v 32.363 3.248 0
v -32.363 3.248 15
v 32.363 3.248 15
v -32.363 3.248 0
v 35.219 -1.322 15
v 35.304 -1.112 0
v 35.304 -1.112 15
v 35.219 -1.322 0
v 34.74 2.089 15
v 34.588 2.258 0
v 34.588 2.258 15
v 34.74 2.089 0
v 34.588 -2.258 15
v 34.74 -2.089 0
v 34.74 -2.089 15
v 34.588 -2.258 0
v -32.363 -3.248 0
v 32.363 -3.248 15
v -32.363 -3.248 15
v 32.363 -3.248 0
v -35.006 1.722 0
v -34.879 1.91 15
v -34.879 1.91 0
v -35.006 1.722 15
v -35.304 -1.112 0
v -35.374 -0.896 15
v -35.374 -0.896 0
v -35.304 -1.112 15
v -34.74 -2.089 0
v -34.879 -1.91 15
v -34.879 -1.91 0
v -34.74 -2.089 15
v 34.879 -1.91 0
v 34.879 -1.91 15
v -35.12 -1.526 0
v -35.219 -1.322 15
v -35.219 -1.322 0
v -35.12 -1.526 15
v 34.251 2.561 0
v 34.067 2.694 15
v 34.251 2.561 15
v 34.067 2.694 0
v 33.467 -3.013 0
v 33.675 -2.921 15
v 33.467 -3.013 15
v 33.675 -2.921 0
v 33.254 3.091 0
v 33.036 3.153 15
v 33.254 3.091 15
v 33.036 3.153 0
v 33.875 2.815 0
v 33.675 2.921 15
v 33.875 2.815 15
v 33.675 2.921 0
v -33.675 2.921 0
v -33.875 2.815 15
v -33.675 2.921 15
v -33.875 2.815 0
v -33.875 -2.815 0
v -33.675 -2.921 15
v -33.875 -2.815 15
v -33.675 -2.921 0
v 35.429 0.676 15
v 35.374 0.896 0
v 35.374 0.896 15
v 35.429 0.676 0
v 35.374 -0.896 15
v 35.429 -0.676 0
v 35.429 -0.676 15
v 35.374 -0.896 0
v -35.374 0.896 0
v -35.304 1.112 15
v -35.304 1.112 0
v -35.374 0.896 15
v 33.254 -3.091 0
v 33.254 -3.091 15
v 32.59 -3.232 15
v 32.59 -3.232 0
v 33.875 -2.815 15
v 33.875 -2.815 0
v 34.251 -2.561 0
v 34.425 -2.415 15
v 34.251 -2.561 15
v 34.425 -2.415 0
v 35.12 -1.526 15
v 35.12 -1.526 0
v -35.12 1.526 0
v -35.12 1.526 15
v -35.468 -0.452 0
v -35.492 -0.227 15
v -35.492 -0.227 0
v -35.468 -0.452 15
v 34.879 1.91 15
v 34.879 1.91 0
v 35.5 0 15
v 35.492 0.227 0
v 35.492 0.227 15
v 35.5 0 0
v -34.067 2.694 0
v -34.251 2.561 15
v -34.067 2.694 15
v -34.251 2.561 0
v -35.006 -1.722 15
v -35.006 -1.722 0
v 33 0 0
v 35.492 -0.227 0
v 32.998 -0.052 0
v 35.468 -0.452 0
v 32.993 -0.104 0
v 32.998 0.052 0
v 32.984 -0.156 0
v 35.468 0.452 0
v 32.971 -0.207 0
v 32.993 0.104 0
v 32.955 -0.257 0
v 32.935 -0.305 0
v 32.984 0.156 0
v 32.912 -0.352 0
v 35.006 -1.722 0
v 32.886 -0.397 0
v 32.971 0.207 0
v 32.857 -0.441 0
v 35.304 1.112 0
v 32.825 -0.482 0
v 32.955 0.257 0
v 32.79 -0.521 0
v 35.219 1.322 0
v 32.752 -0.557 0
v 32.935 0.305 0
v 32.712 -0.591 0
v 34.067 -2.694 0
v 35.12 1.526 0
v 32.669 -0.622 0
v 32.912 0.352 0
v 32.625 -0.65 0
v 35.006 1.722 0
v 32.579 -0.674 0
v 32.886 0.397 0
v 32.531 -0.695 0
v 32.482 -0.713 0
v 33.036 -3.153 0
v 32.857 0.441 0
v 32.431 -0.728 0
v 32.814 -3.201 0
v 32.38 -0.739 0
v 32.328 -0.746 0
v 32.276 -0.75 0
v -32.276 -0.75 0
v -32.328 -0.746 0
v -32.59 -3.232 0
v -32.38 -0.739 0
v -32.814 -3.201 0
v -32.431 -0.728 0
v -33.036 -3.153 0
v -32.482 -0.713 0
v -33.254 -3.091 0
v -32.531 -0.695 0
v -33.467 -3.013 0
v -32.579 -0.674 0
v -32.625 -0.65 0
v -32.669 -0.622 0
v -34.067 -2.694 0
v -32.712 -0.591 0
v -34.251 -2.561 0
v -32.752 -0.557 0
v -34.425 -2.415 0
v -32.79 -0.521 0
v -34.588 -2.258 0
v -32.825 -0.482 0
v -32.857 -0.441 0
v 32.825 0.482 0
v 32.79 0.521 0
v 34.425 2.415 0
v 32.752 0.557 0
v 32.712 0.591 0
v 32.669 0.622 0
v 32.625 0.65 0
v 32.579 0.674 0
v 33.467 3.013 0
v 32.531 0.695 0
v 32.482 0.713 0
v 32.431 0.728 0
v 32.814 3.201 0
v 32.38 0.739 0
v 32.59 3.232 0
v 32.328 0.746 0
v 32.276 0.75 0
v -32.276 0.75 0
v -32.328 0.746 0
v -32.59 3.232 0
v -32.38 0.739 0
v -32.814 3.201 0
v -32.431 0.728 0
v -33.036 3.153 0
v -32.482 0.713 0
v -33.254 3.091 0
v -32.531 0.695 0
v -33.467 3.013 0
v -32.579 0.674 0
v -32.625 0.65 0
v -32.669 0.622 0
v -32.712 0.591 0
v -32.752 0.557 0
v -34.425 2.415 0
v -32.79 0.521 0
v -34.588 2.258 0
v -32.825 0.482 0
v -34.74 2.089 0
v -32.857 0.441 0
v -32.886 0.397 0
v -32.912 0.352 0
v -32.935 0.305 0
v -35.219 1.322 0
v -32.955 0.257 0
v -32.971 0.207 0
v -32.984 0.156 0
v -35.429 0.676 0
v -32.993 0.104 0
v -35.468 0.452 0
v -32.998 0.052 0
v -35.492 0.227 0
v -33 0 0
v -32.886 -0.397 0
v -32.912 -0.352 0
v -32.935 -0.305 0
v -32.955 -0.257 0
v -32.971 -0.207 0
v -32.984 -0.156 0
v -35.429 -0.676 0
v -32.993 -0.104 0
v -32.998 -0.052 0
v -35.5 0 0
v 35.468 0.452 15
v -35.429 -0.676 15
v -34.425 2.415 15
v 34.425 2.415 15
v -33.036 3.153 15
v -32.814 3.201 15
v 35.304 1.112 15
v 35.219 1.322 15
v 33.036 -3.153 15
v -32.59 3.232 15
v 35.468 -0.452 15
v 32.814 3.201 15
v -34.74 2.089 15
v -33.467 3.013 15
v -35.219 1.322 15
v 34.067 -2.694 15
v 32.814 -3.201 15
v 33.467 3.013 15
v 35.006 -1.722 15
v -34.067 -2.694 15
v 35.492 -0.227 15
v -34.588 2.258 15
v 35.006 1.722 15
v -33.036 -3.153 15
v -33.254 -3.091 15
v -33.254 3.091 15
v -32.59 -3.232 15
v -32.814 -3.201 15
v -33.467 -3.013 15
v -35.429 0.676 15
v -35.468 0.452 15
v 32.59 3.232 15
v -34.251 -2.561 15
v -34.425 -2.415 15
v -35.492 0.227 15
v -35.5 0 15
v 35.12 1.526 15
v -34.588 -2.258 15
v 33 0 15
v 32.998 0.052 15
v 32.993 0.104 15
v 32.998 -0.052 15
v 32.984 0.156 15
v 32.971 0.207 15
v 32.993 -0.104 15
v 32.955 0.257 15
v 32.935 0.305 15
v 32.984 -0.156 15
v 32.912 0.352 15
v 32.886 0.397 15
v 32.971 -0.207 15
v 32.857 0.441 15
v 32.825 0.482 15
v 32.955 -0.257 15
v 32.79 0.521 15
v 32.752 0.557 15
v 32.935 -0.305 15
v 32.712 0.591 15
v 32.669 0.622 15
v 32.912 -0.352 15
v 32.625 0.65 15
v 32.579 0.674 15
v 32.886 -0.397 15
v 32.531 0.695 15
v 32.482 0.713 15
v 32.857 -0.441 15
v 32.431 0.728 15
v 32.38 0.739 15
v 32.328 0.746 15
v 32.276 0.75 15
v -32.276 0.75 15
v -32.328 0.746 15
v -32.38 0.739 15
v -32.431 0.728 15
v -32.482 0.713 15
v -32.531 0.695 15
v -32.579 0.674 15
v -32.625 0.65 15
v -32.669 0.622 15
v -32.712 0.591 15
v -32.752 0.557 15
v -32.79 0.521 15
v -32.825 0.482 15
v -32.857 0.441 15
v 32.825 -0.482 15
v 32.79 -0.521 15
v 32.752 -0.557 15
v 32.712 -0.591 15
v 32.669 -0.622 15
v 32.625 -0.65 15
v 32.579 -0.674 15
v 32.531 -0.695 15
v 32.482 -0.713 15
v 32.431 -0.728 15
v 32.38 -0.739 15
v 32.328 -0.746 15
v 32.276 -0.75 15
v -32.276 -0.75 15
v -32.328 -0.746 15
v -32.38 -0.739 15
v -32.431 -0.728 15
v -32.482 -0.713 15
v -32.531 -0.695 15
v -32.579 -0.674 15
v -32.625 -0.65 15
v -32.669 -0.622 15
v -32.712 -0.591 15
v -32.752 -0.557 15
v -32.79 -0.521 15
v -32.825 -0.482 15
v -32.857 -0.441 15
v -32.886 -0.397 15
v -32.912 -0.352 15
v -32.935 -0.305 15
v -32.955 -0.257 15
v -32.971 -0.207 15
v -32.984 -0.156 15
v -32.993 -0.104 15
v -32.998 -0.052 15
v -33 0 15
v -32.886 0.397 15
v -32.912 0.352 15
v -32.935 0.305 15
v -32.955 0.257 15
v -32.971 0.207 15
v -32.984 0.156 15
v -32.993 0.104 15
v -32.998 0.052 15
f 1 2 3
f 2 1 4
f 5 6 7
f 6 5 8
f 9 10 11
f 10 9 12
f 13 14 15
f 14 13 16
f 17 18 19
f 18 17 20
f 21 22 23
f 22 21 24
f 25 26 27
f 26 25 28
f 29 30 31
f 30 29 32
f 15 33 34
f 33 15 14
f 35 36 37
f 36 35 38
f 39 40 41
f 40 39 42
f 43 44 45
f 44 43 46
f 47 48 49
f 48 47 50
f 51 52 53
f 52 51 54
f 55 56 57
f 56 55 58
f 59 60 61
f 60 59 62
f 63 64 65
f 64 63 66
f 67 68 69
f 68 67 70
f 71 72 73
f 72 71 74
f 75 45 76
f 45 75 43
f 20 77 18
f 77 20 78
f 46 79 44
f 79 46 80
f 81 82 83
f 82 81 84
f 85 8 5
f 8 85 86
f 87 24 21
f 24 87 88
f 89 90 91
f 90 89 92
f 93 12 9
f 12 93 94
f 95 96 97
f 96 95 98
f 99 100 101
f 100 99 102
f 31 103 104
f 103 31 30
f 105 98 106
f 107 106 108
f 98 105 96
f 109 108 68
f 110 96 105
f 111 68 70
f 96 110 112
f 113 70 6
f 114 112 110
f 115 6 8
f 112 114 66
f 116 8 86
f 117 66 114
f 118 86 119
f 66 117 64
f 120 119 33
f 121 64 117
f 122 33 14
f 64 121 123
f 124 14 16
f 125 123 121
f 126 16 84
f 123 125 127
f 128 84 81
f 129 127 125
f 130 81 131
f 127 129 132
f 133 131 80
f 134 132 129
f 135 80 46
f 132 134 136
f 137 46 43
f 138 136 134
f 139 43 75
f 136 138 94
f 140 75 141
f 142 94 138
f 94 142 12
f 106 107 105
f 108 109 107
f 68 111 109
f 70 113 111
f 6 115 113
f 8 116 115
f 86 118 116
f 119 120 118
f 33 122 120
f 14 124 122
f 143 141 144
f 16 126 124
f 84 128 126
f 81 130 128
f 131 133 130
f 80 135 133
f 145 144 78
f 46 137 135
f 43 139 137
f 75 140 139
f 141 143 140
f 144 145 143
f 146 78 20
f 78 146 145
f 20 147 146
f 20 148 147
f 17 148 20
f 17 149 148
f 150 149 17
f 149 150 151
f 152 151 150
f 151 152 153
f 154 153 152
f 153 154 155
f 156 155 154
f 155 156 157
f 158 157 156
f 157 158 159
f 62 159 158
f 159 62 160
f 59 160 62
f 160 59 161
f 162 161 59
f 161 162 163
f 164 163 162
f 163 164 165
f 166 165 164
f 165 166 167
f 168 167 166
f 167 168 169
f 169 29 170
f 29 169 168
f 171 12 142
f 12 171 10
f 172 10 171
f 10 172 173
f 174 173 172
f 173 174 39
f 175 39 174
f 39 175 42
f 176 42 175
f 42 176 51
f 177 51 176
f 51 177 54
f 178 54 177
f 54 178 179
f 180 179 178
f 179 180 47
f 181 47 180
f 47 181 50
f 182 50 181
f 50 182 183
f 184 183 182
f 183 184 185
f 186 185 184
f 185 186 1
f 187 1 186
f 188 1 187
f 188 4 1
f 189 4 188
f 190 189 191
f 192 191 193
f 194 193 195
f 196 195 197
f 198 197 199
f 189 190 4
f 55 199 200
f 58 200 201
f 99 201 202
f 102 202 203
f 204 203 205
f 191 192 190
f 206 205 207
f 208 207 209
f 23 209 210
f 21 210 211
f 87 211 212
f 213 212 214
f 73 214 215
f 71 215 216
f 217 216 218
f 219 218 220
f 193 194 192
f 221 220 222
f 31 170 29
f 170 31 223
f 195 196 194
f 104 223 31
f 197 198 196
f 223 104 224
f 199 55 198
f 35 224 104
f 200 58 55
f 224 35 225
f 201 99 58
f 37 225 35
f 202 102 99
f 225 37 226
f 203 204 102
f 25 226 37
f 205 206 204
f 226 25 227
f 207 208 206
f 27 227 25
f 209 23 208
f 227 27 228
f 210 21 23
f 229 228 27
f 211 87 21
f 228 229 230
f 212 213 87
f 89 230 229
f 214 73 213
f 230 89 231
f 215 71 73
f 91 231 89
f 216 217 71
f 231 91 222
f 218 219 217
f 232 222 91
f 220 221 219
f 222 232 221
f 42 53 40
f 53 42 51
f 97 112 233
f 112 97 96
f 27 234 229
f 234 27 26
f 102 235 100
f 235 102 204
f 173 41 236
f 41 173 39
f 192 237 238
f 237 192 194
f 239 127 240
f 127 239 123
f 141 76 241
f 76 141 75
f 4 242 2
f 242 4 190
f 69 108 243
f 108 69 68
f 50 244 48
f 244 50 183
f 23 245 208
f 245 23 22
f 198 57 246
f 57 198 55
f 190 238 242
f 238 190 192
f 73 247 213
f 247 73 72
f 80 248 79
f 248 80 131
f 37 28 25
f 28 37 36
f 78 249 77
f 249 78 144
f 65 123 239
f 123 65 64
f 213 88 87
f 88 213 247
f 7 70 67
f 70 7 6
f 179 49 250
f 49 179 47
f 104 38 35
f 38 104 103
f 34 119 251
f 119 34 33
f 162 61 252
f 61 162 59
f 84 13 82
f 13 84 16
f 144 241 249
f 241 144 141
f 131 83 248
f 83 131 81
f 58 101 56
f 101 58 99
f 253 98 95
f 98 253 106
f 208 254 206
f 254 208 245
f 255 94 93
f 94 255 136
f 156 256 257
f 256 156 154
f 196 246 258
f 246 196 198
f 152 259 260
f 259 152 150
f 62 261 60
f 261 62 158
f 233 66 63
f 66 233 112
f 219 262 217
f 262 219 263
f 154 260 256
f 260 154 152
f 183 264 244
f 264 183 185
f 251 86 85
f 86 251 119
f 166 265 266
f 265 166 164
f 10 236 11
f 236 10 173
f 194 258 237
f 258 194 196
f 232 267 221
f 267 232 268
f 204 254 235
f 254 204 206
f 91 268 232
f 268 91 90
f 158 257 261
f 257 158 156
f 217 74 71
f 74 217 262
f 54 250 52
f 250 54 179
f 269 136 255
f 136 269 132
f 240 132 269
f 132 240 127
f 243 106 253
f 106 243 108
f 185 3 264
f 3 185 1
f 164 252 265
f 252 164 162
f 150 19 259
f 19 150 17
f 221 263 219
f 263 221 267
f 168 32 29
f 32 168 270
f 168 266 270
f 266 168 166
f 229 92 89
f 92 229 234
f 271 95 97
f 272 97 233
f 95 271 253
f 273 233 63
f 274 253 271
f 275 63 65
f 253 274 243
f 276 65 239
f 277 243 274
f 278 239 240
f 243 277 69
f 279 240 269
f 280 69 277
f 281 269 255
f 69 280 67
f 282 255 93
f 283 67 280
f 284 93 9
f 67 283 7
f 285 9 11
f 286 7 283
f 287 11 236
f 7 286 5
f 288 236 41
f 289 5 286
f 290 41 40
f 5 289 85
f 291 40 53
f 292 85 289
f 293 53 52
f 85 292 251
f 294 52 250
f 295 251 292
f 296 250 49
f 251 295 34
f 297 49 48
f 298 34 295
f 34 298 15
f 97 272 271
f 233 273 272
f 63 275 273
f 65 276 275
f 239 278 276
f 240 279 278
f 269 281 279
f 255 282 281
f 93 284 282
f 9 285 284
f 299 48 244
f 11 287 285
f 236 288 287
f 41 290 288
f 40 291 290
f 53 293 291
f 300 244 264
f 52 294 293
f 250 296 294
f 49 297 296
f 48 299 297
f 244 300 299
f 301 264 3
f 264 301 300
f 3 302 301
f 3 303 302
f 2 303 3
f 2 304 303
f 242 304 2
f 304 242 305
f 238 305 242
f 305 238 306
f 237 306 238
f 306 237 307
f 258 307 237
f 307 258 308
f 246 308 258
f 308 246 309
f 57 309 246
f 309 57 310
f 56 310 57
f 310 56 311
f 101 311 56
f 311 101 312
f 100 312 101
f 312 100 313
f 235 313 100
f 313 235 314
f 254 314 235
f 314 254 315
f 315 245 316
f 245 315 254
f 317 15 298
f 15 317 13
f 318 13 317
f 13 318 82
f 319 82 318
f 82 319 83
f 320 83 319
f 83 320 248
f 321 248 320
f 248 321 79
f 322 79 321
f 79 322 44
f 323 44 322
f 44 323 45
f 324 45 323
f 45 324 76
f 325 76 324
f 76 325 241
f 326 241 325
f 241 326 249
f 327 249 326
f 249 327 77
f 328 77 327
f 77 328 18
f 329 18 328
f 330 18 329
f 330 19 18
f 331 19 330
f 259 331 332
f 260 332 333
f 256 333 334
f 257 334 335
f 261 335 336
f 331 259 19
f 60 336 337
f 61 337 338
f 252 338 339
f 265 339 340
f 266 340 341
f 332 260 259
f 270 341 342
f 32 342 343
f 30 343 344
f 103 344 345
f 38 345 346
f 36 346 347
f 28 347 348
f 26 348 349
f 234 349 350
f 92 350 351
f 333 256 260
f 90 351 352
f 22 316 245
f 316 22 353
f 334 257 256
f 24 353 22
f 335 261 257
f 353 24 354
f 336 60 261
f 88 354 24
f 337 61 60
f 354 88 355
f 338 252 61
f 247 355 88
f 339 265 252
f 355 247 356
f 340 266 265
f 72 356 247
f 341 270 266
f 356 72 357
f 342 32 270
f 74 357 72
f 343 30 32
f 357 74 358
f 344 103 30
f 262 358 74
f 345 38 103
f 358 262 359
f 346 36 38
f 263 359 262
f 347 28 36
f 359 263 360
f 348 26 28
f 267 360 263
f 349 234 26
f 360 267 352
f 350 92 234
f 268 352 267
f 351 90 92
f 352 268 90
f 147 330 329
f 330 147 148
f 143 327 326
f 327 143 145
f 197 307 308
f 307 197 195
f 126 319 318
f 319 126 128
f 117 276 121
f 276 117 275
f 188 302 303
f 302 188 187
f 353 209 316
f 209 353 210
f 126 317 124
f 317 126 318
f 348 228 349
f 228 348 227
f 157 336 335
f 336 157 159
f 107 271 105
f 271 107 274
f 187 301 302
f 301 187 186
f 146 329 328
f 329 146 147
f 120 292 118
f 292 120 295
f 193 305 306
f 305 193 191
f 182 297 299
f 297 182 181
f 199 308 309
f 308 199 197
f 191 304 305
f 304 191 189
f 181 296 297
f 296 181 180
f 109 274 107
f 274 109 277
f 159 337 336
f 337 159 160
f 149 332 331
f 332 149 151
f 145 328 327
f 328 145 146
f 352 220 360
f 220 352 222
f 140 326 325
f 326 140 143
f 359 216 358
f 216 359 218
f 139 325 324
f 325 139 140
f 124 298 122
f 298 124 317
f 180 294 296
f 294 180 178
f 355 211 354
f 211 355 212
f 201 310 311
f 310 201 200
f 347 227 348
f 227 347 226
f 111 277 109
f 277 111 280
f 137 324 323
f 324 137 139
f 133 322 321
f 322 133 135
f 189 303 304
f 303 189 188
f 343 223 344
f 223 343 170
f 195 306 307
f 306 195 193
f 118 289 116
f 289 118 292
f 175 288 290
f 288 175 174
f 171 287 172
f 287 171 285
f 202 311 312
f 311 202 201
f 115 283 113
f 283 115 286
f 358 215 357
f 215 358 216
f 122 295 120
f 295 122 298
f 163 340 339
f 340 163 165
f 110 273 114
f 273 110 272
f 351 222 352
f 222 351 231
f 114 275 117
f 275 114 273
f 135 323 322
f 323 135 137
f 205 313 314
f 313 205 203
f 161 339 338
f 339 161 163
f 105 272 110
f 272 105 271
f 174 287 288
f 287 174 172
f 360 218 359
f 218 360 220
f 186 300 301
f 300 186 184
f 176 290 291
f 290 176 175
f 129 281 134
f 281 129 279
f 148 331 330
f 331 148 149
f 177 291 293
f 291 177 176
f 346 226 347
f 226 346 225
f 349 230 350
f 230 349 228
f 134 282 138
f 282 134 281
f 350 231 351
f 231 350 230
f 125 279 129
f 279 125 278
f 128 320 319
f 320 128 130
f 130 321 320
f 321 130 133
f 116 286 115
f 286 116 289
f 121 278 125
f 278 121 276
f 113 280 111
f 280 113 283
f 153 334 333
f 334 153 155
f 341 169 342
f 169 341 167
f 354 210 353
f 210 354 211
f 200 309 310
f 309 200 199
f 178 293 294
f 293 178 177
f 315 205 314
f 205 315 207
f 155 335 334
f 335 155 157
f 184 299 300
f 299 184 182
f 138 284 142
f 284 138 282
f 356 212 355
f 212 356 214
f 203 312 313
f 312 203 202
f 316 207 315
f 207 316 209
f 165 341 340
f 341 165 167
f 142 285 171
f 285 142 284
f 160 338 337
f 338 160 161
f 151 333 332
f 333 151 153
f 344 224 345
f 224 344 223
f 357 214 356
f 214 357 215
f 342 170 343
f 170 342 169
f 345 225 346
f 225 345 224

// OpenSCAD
//
//  toothpastesqueezer.scad
//
//  EvilTeach
//
//  12/11/2016
//

$fn=90;                 // Make very smooth ends


slitWidth  = 66.00;     // Plenty of extra room to make it easy to put on
slitDepth  =  1.50;     // Just a bit too wide to make it easy to put on
slitHeight = 15.00;     // High enough that an adult finger covers it

thickness  =  5.00;     // Material outside of the slit

// Make a cube with rounded ends.
module rounded_cube(width, depth, height)
{
    hull()
    {
        translate([depth / 2, 0, 0])
            cylinder(d = depth, h = height);
        translate([width - depth / 2, 0, 0])
            cylinder(d = depth, h = height);
    }
}



module main()
{
    // Center on build plate
    translate([-((slitWidth + thickness) / 2) , 0, 0])
    
    // Make a large cube and remove the smaller slit from inside it
    difference()
    {
        rounded_cube(slitWidth + thickness, 
                     slitDepth + thickness, 
                     slitHeight);
        translate([thickness / 2, 0, 0])
            rounded_cube(slitWidth, slitDepth, slitHeight);
    }
}

main();
